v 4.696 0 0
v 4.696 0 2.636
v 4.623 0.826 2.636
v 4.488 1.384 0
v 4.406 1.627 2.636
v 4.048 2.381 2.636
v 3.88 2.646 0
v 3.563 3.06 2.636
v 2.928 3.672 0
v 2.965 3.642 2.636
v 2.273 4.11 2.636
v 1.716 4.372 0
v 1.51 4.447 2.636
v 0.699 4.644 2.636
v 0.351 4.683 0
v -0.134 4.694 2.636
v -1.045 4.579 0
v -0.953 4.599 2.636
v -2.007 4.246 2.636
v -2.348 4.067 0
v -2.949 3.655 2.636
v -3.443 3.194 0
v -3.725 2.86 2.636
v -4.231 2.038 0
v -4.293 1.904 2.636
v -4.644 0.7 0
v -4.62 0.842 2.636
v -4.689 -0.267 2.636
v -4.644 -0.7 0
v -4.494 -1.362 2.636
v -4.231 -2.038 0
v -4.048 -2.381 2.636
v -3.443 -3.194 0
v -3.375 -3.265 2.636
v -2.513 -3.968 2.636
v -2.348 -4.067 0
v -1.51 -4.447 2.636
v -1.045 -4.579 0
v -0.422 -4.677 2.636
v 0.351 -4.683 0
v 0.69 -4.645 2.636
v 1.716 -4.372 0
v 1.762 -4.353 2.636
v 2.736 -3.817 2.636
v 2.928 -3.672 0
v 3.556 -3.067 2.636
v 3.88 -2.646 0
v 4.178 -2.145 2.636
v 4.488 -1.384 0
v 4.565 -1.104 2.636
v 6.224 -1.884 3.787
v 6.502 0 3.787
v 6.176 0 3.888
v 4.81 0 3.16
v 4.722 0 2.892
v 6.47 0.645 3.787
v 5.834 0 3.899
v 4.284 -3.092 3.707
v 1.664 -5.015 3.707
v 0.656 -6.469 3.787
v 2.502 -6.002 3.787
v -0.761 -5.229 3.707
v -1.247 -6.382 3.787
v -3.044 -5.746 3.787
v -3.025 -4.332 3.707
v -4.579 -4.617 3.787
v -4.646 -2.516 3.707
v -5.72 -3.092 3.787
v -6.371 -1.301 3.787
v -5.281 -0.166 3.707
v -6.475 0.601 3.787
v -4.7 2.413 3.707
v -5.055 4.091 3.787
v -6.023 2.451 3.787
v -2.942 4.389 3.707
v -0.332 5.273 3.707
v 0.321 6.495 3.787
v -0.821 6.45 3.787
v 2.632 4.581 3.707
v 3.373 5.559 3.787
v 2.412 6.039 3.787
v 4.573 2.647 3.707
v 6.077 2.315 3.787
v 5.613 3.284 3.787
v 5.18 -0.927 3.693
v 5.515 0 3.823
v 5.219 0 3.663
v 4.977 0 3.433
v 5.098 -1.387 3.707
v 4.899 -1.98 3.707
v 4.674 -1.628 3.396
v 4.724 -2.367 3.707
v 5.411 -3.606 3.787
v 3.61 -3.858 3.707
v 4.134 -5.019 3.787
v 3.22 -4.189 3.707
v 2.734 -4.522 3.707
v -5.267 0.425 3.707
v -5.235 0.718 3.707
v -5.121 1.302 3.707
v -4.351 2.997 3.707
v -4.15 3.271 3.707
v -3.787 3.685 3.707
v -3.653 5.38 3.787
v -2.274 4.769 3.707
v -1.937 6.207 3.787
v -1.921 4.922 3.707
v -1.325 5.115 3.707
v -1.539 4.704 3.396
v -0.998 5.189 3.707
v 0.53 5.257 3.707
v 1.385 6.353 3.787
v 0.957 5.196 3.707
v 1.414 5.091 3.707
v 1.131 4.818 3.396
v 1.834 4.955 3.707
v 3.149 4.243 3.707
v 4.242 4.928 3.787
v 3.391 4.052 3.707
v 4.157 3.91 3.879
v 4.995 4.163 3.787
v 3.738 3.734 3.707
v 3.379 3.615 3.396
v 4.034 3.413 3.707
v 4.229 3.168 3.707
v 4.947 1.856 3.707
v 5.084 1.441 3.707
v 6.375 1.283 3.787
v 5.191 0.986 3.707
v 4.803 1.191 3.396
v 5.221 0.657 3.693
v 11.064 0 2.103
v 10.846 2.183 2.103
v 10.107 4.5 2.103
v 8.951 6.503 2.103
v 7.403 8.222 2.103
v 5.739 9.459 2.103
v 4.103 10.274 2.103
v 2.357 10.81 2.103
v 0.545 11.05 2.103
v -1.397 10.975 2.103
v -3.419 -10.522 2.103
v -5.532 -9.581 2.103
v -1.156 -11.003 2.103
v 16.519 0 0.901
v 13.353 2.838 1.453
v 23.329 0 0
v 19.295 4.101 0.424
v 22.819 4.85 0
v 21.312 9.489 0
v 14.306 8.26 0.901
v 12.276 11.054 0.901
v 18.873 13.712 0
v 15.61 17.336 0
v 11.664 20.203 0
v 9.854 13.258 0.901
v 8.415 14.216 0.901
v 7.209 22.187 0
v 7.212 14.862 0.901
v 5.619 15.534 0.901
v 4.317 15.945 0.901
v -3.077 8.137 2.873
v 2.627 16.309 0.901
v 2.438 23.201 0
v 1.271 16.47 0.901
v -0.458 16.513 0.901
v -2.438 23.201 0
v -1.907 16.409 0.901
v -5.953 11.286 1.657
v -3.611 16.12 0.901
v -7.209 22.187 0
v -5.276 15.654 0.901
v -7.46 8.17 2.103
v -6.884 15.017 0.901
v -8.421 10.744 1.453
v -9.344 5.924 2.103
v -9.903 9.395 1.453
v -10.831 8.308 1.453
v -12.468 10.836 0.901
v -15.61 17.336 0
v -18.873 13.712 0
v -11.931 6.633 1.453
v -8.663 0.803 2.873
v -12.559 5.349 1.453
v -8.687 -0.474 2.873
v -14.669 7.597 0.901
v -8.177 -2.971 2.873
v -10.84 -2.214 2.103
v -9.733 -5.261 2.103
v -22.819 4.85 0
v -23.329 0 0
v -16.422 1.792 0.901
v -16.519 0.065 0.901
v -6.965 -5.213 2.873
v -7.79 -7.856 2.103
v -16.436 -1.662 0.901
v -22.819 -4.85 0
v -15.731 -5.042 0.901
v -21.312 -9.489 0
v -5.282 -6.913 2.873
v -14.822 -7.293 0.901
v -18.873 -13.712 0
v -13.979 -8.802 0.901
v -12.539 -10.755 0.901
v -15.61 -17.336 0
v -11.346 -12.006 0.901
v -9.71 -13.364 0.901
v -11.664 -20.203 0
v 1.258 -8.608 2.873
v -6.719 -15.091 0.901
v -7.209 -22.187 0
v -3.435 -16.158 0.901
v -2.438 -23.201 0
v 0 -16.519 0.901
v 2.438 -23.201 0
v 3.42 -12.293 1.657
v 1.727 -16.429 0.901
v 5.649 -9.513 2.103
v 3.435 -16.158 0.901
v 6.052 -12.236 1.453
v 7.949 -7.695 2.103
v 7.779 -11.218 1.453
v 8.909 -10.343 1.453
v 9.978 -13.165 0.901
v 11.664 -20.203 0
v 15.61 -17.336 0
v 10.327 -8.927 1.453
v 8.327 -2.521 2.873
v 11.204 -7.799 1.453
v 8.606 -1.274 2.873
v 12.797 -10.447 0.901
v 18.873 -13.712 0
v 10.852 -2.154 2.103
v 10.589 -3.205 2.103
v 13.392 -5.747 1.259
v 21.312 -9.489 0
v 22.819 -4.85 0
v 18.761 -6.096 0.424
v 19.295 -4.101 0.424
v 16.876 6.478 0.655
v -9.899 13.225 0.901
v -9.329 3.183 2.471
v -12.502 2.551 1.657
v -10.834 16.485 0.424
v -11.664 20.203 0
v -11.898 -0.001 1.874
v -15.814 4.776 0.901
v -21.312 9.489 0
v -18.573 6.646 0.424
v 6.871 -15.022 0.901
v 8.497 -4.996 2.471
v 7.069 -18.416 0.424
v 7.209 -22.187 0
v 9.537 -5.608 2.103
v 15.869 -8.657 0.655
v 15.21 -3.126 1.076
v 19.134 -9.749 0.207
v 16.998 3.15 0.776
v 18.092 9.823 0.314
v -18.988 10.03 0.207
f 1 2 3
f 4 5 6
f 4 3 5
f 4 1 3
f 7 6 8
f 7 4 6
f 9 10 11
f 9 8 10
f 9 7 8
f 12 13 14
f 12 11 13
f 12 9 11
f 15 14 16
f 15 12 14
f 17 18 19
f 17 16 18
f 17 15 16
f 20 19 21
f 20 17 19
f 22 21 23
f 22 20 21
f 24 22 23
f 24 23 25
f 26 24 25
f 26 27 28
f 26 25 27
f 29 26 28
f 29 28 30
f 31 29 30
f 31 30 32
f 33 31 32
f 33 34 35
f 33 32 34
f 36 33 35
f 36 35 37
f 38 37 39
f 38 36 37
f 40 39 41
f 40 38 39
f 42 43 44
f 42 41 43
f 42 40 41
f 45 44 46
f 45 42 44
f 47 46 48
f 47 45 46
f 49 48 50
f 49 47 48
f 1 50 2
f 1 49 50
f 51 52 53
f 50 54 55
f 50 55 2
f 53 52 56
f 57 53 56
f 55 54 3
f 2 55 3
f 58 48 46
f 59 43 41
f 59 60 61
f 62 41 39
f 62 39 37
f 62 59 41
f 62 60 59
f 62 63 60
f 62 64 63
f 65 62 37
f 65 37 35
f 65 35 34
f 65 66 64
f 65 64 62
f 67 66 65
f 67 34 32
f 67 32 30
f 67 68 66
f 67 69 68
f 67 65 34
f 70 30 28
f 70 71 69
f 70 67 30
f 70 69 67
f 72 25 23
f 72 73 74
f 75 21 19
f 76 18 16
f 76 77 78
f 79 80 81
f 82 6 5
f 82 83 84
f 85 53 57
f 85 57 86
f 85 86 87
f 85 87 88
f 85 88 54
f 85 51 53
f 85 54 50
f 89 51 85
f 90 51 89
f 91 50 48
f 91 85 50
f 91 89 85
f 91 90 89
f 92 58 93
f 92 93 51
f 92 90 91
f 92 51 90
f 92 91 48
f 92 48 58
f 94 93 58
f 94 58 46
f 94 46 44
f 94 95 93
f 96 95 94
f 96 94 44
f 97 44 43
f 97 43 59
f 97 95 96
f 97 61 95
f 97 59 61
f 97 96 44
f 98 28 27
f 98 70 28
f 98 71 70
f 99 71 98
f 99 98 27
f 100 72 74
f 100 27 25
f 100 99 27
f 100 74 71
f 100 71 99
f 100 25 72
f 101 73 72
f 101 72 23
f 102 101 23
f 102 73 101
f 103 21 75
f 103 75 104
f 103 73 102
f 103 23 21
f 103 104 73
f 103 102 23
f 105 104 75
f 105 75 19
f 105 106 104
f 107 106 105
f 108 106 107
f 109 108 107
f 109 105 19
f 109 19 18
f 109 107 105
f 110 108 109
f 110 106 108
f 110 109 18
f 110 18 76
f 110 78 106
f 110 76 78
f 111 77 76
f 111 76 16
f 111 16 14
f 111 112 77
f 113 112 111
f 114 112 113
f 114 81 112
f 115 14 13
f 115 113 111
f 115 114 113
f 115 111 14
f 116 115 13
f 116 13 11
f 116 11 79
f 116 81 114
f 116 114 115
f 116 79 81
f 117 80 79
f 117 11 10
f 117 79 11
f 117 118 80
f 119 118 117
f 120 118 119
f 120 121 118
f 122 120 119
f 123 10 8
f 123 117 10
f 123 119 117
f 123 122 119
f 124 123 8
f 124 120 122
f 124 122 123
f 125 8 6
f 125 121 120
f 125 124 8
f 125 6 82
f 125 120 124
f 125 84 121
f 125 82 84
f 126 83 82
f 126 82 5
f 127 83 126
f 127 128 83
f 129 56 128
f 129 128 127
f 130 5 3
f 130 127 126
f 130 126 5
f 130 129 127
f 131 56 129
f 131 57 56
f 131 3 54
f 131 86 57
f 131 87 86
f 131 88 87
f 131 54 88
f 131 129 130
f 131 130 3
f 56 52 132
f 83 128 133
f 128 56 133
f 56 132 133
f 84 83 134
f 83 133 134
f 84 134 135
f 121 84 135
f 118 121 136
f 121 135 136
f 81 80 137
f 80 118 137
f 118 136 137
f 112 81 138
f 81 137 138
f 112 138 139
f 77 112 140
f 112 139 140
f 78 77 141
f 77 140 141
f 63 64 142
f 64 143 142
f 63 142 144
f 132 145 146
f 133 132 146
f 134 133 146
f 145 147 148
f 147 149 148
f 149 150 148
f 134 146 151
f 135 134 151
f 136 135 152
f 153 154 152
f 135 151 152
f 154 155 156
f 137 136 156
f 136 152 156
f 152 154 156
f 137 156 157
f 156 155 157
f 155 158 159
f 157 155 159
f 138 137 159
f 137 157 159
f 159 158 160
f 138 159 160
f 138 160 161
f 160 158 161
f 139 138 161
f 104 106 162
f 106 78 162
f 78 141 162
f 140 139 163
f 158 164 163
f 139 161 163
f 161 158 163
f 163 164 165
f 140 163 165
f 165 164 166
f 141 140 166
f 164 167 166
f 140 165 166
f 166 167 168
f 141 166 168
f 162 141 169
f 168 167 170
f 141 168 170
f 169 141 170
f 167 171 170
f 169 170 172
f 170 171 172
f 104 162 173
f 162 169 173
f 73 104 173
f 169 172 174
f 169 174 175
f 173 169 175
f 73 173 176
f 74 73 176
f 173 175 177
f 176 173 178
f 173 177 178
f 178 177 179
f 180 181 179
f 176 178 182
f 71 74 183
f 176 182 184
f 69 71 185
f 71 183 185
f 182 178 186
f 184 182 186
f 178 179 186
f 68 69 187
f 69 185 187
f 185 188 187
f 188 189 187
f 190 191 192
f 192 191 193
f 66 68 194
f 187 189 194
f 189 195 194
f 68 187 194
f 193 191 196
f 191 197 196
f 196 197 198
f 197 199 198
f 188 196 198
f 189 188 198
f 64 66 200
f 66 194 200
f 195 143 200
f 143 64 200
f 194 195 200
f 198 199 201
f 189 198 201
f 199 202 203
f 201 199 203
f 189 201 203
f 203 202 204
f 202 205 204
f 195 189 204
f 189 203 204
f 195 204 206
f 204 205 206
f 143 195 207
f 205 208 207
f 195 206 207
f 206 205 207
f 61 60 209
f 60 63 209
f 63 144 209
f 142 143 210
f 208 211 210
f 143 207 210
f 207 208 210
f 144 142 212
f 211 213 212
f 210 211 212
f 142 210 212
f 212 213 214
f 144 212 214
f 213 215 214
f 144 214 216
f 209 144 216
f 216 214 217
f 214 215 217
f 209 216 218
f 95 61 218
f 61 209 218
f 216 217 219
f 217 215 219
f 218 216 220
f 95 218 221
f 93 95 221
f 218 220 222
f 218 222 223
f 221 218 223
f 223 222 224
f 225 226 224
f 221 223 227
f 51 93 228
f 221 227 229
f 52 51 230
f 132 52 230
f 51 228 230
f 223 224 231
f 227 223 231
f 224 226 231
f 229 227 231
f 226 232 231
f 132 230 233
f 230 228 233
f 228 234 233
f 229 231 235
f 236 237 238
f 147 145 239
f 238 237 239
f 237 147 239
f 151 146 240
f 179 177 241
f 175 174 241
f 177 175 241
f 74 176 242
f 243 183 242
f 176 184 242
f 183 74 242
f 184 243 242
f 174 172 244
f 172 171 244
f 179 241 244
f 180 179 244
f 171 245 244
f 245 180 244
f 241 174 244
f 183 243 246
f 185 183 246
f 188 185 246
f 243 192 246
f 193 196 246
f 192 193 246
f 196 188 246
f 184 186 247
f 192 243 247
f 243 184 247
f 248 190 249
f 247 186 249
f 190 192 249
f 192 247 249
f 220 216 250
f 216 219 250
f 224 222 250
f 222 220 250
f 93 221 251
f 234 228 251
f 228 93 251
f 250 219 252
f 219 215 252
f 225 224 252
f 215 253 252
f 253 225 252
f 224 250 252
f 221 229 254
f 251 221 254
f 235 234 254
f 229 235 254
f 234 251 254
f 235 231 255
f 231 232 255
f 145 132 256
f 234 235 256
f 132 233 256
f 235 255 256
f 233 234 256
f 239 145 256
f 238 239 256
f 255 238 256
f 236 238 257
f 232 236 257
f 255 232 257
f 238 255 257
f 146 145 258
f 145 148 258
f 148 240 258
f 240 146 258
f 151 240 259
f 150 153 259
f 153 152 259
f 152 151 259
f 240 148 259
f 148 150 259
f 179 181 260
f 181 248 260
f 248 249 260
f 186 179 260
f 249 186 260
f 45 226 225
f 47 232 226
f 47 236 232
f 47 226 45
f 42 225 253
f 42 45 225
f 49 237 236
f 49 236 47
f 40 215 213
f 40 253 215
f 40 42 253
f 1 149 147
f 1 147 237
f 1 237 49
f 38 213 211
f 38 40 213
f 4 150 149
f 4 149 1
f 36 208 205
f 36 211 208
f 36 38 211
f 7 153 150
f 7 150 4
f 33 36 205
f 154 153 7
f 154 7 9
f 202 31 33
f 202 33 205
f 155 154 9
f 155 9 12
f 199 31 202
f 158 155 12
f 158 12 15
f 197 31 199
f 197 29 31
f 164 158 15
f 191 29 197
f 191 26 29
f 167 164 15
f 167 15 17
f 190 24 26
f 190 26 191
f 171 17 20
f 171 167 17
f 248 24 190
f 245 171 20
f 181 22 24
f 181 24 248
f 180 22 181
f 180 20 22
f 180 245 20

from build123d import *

# Parameters (mm, degrees)
F2_R     = 4.6963354408
F3_DEPTH = 25.4
F4_R     = 1.27


with BuildPart() as f1:
    # F0 (on Front) → F1 (revolve)
    with BuildSketch(Plane.XZ):
        with BuildLine():
            Line((0, 7.8808171675), (0, 0))
            Line((0, 0), (23.3285166323, 0))
            add(Edge.make_bspline(
                [(0, 7.8808171675), (6.3383360393, 2.8902275953), (11.6642583162, 1.2399421539), (23.3285166323, 0)],
                knots=[0, 0, 0, 0, 24.6237074278, 24.6237074278, 24.6237074278, 24.6237074278], degree=3))
        make_face()
    revolve(axis=Axis((0, 0, 3.9404085837), (0, 0, 1)))

    # F2 (on Top) → F3 (cut)
    with BuildSketch(Plane.XY):
        Circle(F2_R)
    extrude(amount=F3_DEPTH, mode=Mode.SUBTRACT)

    # F4
    f4_edges = [f1.edges().sort_by_distance(p)[0] for p in [
        (-4.696335, 0, 4.708633),
    ]]
    fillet(f4_edges, radius=F4_R)


solid = f1.part
